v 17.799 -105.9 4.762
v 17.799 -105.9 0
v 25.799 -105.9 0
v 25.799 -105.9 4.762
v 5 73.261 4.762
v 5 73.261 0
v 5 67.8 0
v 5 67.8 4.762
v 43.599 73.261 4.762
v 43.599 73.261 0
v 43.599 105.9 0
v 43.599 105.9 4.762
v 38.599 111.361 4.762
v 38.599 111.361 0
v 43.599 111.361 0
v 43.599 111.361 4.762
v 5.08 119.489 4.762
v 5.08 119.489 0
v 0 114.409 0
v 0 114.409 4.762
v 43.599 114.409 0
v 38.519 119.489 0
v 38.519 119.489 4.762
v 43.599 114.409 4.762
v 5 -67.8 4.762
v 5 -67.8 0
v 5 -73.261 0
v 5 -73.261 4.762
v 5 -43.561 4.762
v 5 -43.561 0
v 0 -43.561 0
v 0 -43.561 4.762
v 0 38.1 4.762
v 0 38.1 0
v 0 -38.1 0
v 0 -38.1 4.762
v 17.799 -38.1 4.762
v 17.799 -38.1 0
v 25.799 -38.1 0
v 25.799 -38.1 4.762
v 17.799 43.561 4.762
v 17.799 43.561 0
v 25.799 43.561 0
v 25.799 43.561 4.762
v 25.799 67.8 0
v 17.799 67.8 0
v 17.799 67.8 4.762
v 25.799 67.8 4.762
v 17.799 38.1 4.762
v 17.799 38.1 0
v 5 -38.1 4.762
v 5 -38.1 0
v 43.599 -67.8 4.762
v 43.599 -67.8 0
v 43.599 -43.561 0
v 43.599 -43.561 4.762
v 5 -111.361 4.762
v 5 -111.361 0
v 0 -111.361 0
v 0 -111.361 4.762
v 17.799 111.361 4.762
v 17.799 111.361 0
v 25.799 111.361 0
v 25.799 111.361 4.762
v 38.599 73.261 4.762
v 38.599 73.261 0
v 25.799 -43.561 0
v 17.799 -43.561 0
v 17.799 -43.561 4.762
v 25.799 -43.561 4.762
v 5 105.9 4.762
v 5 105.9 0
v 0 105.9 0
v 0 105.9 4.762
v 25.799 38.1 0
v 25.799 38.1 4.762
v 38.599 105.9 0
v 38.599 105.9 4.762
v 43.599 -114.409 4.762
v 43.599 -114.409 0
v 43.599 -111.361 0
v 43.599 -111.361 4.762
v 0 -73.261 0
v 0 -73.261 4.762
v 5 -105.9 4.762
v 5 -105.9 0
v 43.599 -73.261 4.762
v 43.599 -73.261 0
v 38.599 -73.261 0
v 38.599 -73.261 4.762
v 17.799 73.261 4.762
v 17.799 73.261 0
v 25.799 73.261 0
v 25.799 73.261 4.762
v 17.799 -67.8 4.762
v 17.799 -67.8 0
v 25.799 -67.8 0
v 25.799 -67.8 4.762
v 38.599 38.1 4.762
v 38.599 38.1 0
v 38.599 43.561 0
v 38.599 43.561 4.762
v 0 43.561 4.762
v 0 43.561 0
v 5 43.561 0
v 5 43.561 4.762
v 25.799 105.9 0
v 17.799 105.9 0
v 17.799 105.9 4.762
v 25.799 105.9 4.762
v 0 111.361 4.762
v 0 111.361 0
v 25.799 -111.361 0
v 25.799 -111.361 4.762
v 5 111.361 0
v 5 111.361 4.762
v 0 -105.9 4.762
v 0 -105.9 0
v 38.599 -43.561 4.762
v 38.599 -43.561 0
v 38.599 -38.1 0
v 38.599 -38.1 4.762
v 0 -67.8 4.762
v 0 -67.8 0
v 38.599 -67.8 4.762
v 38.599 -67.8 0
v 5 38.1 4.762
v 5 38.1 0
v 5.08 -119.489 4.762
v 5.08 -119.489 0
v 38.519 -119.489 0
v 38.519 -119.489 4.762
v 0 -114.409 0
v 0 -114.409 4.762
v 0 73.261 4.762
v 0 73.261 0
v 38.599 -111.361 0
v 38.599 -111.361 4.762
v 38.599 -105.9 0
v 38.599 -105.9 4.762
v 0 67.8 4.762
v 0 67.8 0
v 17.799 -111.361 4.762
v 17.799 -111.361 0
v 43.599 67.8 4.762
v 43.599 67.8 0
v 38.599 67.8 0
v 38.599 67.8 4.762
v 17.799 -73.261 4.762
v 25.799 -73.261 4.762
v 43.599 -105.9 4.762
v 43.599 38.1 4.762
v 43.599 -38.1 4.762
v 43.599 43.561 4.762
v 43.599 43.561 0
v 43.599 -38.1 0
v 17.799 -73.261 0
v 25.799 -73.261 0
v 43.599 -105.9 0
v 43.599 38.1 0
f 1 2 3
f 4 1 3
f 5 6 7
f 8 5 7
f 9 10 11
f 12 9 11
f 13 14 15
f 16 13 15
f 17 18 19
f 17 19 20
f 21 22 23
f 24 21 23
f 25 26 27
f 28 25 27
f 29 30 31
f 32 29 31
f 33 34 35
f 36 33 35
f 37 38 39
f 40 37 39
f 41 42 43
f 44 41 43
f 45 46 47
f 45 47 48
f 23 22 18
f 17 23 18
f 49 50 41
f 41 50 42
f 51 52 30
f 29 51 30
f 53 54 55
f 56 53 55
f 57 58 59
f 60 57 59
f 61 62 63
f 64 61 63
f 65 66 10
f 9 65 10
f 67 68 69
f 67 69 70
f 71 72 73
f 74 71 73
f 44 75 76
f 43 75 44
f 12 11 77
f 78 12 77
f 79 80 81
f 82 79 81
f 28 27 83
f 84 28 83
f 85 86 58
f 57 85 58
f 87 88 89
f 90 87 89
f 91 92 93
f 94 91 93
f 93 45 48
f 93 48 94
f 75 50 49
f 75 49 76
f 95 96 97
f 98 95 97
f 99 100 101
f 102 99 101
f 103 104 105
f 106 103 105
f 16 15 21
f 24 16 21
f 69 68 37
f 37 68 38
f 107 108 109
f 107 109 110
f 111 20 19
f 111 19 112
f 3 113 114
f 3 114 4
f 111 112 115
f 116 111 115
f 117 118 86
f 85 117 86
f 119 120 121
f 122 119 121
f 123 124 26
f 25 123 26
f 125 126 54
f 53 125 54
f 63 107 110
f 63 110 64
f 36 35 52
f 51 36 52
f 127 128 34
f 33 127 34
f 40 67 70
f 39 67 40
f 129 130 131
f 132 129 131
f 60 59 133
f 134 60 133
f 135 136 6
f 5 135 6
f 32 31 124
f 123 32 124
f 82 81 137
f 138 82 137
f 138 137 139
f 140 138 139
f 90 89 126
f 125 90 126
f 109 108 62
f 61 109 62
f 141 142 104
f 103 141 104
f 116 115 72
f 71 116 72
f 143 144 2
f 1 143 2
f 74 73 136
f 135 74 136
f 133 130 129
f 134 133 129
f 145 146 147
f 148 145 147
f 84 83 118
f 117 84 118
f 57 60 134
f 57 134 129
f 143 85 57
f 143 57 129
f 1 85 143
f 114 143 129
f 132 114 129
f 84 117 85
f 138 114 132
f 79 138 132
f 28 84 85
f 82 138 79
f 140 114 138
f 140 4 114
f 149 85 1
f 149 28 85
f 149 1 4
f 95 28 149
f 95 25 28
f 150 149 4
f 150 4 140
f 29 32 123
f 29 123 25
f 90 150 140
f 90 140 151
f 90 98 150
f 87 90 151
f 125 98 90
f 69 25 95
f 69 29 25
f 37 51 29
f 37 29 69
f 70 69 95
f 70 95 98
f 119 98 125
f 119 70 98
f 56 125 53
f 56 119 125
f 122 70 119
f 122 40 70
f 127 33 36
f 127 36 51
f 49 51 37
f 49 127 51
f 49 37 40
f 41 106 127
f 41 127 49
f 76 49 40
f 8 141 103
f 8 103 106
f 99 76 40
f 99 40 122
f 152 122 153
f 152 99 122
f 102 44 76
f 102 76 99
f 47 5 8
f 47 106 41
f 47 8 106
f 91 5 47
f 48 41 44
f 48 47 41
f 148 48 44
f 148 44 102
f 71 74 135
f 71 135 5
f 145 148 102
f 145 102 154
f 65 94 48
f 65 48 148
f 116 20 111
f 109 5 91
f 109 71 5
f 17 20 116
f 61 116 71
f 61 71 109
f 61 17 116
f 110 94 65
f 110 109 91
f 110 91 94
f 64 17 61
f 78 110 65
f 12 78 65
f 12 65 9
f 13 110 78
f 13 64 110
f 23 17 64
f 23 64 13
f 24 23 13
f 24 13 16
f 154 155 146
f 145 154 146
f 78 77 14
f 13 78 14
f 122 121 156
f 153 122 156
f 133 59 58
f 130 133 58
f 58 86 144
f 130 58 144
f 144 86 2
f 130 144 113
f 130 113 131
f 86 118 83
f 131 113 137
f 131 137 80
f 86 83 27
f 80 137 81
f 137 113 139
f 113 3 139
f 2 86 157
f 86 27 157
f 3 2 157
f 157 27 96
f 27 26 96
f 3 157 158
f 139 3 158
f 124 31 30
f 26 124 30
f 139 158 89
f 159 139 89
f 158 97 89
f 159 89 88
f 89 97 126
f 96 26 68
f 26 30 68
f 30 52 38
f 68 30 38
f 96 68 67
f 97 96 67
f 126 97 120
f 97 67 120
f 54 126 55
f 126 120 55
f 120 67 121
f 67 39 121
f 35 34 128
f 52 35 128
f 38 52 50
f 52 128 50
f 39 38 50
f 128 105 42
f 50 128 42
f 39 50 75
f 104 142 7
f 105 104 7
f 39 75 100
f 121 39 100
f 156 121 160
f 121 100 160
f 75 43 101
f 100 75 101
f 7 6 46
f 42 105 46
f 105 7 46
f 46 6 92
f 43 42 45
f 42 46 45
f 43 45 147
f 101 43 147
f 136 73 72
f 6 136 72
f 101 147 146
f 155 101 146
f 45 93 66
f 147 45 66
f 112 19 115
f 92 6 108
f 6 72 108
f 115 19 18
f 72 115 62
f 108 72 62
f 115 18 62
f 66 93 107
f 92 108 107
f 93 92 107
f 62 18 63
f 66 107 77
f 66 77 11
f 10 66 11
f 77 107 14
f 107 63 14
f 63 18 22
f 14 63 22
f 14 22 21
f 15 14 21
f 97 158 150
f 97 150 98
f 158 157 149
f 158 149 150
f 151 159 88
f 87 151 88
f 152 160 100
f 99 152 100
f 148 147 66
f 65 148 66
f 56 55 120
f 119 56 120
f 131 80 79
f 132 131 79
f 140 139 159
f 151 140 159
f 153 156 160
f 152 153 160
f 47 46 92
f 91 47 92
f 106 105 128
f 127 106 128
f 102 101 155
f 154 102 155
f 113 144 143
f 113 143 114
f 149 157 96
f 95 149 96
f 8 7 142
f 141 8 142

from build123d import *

# Parameters (mm, degrees)
SKETCH1_W           = 8
SKETCH1_H           = 5.461
BOSS_EXTRUDE1_DEPTH = 4.7625
CHAMFER1_SIZE       = 5.08


with BuildPart() as part:
    # Sketch1 → Boss-Extrude1 (new body)
    with BuildSketch(Plane.XY):
        Polygon((43.598645263, 119.489), (0, 119.489), (0, 111.361), (5, 111.361), (5, 105.9), (0, 105.9), (0, 73.261), (5, 73.261), (5, 67.8), (0, 67.8), (0, 43.561), (5, 43.561), (5, 38.1), (0, 38.1), (0, -38.1), (5, -38.1), (5, -43.561), (0, -43.561), (0, -67.8), (5, -67.8), (5, -73.261), (0, -73.261), (0, -105.9), (5, -105.9), (5, -111.361), (0, -111.361), (0, -119.489), (43.598645263, -119.489), (43.598645263, -111.361), (38.598645263, -111.361), (38.598645263, -105.9), (43.598645263, -105.9), (43.598645263, -73.261), (38.598645263, -73.261), (38.598645263, -67.8), (43.598645263, -67.8), (43.598645263, -43.561), (38.598645263, -43.561), (38.598645263, -38.1), (43.598645263, -38.1), (43.598645263, 38.1), (38.598645263, 38.1), (38.598645263, 43.561), (43.598645263, 43.561), (43.598645263, 67.8), (38.598645263, 67.8), (38.598645263, 73.261), (43.598645263, 73.261), (43.598645263, 105.9), (38.598645263, 105.9), (38.598645263, 111.361), (43.598645263, 111.361), align=None)
        with Locations((21.799322631, 108.6305)):
            Rectangle(SKETCH1_W, SKETCH1_H, mode=Mode.SUBTRACT)
        with Locations((21.799322631, 70.5305)):
            Rectangle(SKETCH1_W, SKETCH1_H, mode=Mode.SUBTRACT)
        with Locations((21.799322631, 40.8305)):
            Rectangle(SKETCH1_W, SKETCH1_H, mode=Mode.SUBTRACT)
        with Locations((21.799322631, -40.8305)):
            Rectangle(SKETCH1_W, SKETCH1_H, mode=Mode.SUBTRACT)
        with Locations((21.799322631, -70.5305)):
            Rectangle(SKETCH1_W, SKETCH1_H, mode=Mode.SUBTRACT)
        with Locations((21.799322631, -108.6305)):
            Rectangle(SKETCH1_W, SKETCH1_H, mode=Mode.SUBTRACT)
    extrude(amount=BOSS_EXTRUDE1_DEPTH)

    # Chamfer1
    chamfer1_edges = [part.edges().sort_by_distance(p)[0] for p in [
        (43.598645263, -119.489, 2.38125),
        (0, -119.489, 2.38125),
        (0, 119.489, 2.38125),
        (43.598645263, 119.489, 2.38125),
    ]]
    chamfer(chamfer1_edges, length=CHAMFER1_SIZE)


solid = part.part
